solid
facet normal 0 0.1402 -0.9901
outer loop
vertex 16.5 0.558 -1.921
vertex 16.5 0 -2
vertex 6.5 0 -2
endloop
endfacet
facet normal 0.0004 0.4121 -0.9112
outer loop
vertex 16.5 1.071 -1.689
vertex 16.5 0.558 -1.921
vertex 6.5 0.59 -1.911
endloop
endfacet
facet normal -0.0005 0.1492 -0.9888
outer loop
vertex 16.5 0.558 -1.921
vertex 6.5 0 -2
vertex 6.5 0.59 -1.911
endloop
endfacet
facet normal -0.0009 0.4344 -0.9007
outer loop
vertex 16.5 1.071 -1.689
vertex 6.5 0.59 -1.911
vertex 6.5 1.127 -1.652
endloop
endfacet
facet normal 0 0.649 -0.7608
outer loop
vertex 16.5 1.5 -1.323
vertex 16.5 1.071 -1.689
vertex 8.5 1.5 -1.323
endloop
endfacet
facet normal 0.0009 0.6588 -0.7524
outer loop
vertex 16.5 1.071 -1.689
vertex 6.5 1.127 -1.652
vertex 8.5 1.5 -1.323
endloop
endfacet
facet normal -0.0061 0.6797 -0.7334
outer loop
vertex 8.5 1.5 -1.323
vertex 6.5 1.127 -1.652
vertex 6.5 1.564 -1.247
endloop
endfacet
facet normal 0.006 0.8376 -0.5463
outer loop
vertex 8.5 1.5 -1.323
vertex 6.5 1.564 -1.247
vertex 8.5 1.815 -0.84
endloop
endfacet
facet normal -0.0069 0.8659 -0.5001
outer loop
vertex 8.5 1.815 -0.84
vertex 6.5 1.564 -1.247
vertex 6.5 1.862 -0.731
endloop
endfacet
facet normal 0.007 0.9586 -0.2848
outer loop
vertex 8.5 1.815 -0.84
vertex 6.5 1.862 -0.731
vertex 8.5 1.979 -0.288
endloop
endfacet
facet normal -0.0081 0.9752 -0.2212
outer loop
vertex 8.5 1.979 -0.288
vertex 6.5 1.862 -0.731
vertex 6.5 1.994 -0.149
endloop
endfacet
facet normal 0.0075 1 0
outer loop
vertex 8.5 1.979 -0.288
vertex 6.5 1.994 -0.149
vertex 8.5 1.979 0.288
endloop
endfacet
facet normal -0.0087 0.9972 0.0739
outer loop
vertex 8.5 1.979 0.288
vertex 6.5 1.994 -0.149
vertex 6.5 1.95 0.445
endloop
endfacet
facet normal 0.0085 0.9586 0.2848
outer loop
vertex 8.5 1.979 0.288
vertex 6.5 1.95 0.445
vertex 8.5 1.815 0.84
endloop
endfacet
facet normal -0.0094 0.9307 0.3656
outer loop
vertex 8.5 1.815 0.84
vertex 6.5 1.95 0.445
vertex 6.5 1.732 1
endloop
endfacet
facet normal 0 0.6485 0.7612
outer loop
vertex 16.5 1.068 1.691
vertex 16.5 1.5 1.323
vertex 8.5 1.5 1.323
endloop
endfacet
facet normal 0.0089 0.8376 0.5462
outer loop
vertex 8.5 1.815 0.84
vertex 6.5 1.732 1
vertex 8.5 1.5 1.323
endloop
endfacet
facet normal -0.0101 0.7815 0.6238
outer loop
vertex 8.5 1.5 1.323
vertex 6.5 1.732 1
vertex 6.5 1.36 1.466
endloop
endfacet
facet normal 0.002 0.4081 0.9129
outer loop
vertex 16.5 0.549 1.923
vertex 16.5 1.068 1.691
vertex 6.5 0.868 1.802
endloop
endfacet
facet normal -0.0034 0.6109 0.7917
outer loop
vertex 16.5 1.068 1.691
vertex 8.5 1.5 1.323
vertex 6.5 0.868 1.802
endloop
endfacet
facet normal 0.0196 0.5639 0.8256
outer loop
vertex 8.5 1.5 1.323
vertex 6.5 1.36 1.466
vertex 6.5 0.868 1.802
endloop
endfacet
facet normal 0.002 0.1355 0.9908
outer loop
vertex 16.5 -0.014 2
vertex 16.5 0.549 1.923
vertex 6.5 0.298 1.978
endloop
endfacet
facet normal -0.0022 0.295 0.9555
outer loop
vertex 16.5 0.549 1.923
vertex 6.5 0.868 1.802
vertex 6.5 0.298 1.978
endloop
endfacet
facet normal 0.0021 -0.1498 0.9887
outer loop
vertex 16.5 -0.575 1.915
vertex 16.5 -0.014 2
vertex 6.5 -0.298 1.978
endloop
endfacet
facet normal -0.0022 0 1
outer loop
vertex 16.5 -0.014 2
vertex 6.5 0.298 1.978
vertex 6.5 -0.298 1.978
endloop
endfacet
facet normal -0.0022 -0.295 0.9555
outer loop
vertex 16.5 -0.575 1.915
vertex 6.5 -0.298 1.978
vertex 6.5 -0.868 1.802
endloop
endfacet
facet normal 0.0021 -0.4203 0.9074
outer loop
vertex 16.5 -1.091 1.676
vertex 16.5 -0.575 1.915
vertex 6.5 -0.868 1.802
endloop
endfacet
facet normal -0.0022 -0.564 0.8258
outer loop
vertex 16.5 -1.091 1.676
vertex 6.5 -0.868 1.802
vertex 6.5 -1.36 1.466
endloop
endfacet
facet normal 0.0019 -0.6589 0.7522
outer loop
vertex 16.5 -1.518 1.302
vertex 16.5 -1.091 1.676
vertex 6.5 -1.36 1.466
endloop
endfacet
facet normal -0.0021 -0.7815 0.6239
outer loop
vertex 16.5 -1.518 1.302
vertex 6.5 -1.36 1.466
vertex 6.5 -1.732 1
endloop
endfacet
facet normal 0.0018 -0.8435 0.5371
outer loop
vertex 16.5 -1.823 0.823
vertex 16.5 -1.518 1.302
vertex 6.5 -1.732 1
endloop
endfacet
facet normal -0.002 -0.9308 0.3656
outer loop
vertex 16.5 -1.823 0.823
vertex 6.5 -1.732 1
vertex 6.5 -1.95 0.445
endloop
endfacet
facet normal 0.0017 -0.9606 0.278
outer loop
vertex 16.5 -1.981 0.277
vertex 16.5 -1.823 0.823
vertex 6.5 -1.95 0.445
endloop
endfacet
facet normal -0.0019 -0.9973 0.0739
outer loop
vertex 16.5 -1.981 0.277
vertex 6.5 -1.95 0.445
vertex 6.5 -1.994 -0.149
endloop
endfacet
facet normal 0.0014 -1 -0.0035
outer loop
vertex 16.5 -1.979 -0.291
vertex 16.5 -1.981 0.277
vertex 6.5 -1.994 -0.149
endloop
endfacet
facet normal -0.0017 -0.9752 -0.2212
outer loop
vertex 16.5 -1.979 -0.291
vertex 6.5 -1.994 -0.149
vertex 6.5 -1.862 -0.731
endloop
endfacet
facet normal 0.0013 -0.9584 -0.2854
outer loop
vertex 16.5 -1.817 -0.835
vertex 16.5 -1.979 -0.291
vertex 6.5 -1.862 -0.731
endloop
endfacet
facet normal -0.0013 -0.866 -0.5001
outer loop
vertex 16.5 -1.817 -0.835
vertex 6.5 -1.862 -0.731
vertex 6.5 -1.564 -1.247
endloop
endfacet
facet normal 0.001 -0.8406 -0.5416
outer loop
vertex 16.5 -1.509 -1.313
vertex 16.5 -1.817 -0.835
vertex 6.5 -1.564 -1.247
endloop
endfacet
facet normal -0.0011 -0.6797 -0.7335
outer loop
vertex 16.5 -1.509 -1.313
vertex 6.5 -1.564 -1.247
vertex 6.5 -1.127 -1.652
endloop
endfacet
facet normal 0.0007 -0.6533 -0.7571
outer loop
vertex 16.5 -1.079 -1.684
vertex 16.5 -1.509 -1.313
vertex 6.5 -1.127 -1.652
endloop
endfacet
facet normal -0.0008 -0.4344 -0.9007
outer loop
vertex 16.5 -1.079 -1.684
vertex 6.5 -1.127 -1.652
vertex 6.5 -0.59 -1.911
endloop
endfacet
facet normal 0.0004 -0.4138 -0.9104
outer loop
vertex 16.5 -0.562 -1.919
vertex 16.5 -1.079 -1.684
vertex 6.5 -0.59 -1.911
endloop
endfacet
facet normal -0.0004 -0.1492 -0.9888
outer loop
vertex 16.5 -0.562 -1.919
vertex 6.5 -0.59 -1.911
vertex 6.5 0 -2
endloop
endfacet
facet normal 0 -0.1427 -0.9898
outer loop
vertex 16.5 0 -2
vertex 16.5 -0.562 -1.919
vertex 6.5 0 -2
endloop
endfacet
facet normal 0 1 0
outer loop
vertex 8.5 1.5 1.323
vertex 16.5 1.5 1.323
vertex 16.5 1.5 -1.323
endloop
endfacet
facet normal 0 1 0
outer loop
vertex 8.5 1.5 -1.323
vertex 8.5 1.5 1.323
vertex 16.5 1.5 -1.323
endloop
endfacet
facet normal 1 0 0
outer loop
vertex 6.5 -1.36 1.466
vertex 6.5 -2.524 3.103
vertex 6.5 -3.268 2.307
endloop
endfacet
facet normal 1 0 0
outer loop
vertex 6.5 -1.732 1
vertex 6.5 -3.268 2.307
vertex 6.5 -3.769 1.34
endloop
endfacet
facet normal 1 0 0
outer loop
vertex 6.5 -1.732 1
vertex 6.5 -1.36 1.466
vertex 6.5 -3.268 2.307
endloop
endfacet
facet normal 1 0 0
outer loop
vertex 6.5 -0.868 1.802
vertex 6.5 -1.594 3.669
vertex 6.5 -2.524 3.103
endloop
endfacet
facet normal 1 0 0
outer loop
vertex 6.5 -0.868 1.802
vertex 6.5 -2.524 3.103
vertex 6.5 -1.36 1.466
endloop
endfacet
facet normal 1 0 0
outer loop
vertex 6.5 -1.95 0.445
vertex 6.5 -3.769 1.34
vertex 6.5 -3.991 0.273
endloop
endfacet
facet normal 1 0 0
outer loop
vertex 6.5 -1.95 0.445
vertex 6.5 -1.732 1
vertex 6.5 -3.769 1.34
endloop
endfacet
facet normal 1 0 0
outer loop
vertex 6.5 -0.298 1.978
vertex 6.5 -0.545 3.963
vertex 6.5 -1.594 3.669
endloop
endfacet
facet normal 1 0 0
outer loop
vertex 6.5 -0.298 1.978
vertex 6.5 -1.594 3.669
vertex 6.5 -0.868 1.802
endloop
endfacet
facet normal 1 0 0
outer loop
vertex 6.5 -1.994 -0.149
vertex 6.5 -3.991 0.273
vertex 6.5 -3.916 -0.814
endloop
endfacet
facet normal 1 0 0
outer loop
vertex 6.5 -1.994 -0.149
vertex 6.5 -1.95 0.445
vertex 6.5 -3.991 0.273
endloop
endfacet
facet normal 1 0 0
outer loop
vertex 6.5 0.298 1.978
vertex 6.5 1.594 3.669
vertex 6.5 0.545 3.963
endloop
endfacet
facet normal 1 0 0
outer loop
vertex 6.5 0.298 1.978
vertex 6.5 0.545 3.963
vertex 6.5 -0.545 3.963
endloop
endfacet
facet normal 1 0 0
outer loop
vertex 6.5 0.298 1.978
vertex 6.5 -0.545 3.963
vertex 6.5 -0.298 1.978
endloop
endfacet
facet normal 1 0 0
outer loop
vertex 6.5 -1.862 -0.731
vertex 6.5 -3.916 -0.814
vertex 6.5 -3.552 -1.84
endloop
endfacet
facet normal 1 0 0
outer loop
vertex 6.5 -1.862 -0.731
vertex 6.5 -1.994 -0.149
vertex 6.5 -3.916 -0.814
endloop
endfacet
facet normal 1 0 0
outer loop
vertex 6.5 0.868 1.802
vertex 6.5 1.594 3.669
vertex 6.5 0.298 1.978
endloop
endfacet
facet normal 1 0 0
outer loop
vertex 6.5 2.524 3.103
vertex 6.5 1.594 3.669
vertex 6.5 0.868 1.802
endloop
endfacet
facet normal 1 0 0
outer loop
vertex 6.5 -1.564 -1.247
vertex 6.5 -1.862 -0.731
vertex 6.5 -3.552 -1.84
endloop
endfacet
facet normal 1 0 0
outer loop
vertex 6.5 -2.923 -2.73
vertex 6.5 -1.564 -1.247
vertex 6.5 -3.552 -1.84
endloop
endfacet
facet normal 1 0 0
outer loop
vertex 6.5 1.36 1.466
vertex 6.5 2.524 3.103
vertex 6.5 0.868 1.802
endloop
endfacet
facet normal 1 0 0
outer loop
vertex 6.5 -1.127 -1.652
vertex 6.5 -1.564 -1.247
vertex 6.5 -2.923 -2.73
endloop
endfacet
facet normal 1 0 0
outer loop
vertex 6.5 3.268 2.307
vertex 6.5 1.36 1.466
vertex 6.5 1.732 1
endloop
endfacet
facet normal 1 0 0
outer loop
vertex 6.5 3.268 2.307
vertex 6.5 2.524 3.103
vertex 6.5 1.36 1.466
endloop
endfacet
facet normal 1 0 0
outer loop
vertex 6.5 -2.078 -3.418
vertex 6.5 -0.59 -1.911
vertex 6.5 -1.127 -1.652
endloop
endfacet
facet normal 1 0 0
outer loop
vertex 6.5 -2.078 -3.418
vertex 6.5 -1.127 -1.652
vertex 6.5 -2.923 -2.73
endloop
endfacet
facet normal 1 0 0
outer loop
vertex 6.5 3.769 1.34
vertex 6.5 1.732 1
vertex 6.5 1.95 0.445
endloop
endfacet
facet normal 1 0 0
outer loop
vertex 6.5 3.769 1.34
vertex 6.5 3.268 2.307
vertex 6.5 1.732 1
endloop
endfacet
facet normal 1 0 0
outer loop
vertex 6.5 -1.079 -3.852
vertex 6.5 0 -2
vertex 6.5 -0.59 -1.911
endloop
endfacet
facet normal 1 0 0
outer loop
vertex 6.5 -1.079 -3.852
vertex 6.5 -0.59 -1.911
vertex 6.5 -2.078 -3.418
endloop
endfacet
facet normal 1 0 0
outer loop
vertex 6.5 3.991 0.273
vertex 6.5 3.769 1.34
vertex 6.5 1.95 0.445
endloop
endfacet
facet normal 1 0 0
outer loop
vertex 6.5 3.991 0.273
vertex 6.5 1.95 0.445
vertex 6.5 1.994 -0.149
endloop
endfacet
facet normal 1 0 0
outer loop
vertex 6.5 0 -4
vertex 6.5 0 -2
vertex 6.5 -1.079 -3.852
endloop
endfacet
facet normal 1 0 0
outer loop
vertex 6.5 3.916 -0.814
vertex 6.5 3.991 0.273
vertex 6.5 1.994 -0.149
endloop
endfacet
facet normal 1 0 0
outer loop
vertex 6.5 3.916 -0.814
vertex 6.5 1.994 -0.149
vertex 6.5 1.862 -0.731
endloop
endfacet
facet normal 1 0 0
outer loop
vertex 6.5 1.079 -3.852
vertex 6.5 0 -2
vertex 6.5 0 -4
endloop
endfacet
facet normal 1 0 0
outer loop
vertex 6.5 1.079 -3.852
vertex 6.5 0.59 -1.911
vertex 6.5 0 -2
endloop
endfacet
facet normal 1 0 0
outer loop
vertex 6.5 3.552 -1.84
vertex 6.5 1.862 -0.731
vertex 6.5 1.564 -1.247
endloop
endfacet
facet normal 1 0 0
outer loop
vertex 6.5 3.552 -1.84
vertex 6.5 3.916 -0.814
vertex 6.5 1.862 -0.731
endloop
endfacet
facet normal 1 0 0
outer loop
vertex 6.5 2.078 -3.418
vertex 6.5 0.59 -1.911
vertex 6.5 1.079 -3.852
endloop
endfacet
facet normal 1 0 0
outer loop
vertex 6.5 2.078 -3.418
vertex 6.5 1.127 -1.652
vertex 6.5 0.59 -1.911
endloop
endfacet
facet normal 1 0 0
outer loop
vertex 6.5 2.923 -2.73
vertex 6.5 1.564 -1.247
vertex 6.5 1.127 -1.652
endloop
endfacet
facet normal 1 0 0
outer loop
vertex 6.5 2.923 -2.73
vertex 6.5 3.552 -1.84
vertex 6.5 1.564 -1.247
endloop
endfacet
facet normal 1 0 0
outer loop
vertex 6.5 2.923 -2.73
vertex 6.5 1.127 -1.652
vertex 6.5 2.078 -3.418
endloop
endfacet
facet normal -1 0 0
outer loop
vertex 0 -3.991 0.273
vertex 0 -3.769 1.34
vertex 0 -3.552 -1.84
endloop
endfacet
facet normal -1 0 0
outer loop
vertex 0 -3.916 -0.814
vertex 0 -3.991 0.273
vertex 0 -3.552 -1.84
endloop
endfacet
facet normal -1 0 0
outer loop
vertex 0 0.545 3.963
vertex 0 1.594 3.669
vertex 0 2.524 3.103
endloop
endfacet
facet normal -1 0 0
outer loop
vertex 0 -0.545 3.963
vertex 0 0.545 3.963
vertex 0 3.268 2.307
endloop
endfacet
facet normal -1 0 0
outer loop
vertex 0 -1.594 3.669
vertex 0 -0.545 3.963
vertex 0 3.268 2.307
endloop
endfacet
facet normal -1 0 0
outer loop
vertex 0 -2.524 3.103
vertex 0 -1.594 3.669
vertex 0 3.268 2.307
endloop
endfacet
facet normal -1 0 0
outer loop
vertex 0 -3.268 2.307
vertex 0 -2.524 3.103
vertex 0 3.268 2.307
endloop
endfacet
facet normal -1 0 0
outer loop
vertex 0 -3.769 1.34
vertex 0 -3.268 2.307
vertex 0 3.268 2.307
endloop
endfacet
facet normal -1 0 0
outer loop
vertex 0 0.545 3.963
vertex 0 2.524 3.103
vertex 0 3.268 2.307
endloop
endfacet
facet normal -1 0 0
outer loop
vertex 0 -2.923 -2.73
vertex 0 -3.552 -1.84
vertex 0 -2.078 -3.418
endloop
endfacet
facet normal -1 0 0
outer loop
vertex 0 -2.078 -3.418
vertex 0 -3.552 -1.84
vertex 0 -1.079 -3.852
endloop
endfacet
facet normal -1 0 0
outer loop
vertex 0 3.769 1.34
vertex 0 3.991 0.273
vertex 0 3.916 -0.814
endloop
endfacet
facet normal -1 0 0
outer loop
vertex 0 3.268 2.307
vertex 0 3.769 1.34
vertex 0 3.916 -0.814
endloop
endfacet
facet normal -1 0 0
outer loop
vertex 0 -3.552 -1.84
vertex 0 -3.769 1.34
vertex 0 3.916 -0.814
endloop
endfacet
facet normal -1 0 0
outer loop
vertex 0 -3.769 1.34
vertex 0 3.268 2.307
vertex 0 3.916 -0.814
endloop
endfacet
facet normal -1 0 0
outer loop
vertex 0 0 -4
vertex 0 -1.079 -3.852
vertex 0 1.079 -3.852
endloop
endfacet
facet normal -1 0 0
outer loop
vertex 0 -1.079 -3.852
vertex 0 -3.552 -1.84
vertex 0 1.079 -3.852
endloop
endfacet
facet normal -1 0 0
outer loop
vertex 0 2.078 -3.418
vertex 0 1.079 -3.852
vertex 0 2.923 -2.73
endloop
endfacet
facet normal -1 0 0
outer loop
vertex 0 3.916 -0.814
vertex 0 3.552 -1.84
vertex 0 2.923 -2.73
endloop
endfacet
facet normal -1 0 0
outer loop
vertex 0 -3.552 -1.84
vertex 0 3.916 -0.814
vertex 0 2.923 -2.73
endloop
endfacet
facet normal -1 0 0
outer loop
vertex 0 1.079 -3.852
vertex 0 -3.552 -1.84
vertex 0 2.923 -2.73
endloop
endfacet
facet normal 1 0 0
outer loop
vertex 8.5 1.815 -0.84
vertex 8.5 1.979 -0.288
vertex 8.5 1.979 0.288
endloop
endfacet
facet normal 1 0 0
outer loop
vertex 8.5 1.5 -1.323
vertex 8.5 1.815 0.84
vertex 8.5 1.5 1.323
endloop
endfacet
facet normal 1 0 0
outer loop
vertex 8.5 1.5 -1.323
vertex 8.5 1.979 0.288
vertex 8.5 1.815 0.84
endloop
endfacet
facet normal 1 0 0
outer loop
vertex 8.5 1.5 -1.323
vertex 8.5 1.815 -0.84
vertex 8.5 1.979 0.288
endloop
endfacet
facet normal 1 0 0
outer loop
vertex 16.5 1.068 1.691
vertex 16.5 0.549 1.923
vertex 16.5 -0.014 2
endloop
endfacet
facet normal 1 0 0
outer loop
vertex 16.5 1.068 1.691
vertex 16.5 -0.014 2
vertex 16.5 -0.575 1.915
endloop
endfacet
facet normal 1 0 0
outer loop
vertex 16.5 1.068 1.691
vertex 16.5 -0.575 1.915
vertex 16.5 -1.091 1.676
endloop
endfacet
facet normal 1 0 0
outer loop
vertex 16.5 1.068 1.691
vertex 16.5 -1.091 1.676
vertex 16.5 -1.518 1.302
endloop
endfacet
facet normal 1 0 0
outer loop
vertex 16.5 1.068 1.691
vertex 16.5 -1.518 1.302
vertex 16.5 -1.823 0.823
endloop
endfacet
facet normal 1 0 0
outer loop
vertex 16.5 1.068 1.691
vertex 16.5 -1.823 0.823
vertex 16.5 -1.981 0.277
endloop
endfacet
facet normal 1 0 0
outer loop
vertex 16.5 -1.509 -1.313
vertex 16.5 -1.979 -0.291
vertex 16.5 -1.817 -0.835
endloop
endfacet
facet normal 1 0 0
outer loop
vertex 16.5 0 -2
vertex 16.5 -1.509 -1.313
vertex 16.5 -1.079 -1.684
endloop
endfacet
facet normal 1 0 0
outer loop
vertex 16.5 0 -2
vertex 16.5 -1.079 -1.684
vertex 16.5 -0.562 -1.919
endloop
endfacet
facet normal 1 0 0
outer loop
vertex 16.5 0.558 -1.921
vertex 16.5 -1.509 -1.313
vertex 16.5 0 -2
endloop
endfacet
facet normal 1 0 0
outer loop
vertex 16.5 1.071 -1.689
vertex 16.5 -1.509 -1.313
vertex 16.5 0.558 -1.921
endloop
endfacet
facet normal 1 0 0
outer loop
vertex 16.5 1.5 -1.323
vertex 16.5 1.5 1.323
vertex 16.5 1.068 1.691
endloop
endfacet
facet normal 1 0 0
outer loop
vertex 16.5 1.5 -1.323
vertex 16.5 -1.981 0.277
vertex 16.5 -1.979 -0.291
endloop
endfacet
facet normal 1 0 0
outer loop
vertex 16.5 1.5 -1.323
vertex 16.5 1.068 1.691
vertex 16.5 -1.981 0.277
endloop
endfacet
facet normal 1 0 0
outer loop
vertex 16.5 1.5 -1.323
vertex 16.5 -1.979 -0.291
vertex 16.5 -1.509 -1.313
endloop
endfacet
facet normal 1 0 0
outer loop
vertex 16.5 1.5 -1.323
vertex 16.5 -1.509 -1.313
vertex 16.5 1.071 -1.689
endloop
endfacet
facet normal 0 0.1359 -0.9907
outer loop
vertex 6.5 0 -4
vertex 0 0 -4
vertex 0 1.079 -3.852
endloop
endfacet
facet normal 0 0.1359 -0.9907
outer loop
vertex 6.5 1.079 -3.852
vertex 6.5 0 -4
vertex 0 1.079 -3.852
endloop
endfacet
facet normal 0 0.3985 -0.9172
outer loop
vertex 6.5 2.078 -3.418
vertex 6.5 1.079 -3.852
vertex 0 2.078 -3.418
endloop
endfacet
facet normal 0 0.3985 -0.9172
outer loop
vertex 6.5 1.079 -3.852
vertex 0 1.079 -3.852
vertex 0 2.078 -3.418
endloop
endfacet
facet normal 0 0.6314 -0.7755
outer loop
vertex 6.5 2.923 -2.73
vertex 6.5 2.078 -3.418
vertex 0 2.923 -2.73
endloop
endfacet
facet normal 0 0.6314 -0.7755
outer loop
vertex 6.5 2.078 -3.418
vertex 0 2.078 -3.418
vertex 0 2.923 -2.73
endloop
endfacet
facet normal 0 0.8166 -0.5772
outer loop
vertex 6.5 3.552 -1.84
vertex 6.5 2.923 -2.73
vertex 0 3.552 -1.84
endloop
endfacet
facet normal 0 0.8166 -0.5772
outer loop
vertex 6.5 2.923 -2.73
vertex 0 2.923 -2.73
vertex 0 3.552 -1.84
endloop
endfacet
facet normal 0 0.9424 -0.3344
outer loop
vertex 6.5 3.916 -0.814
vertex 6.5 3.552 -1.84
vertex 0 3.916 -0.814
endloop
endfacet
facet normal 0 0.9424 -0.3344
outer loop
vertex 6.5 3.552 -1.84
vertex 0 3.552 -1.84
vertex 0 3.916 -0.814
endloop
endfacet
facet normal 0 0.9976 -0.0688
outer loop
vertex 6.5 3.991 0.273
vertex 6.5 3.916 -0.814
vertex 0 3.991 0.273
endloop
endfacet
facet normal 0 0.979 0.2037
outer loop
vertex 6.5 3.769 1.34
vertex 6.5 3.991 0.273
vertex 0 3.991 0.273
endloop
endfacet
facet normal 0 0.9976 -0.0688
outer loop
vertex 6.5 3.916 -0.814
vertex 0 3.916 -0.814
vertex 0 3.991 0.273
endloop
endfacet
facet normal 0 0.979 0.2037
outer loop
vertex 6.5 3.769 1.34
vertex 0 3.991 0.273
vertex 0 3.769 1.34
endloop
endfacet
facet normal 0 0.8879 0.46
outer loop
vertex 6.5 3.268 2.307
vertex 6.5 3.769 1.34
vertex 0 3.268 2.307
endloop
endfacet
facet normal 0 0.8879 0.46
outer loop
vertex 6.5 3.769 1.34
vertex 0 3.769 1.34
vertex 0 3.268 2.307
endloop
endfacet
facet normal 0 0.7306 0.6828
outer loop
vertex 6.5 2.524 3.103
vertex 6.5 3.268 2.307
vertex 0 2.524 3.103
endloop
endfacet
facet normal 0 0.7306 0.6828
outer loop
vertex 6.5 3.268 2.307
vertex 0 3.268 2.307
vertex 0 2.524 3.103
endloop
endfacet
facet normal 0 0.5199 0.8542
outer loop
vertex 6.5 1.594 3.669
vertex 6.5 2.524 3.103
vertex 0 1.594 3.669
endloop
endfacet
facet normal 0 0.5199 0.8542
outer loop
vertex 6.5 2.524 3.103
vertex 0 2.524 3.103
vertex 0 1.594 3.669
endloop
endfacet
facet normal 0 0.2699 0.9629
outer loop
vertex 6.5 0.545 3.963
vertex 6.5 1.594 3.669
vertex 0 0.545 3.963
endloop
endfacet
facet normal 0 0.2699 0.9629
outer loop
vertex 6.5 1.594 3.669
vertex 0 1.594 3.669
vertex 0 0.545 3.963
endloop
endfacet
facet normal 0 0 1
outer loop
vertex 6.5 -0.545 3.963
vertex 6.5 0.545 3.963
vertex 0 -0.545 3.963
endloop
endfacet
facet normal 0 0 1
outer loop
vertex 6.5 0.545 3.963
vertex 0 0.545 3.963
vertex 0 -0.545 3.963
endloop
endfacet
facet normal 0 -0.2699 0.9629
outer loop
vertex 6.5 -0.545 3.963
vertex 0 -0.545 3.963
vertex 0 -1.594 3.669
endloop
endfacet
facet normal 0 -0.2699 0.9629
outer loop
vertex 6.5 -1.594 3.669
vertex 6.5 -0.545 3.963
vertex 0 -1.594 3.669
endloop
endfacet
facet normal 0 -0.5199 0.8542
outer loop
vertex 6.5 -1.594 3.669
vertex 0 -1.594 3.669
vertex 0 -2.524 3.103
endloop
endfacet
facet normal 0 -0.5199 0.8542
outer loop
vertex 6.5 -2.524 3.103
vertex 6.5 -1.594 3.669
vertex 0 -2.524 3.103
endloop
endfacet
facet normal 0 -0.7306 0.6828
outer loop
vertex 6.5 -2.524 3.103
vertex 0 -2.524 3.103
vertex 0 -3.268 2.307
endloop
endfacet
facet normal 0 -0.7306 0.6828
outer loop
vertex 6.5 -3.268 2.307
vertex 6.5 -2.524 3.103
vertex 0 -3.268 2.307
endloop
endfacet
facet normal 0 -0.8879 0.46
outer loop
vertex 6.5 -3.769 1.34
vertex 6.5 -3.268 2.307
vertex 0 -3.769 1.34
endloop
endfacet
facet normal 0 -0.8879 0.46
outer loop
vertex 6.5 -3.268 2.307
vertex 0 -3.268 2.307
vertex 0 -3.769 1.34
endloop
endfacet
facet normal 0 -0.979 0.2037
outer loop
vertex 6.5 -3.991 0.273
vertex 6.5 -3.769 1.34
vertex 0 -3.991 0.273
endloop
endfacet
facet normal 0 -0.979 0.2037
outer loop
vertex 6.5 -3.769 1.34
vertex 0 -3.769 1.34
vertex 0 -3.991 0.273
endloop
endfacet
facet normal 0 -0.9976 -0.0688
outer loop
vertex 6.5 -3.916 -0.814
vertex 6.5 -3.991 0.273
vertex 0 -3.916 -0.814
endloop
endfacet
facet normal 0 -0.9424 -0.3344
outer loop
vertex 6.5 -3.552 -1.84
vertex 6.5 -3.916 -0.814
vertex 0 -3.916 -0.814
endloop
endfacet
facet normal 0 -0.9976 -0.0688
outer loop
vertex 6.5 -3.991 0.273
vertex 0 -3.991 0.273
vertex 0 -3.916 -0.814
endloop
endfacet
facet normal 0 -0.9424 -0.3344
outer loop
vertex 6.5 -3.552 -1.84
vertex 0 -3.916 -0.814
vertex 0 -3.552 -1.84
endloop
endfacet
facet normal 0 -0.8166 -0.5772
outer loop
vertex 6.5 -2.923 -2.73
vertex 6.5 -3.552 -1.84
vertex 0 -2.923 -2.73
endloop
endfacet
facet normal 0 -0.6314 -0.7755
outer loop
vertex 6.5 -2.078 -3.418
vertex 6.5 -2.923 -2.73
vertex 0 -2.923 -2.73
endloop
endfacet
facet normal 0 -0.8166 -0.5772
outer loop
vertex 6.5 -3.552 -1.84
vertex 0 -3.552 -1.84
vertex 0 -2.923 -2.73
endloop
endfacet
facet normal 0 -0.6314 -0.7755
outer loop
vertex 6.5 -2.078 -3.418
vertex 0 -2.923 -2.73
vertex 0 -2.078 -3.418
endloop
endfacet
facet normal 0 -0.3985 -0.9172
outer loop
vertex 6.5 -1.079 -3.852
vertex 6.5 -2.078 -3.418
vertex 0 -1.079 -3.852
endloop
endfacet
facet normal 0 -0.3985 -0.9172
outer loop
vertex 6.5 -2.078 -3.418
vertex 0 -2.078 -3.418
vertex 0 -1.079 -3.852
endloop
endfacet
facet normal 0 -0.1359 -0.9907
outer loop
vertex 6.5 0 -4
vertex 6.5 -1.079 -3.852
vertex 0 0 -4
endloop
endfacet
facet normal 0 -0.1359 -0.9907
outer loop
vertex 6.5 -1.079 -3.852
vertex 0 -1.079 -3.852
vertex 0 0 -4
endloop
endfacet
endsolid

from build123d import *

# Parameters (mm, degrees)
ESQUISSE1_R             = 4
BOSS_EXTRU_1_DEPTH      = 6.5
ESQUISSE2_R             = 2
BOSS_EXTRU_2_DEPTH      = 10
ESQUISSE3_W             = 4
ESQUISSE3_H             = 0.5
ENL_V_MAT_EXTRU_1_DEPTH = 8


with BuildPart() as part:
    # Esquisse1 → Boss.-Extru.1 (new body)
    with BuildSketch(Plane(origin=(0, 0, 0), x_dir=(0, 0, -1), z_dir=(1, 0, 0))):
        Circle(ESQUISSE1_R)
    extrude(amount=BOSS_EXTRU_1_DEPTH)

    # Esquisse2 → Boss.-Extru.2 (add)
    with BuildSketch(Plane(origin=(6.5, 0, 0), x_dir=(0, 0, -1), z_dir=(1, 0, 0))):
        Circle(ESQUISSE2_R)
    extrude(amount=BOSS_EXTRU_2_DEPTH)

    # Esquisse3 → Enlèv. mat.-Extru.1 (cut)
    with BuildSketch(Plane(origin=(16.5, 0, 0), x_dir=(0, 0, -1), z_dir=(1, 0, 0))):
        with Locations((0, 1.75)):
            Rectangle(ESQUISSE3_W, ESQUISSE3_H)
    extrude(amount=-ENL_V_MAT_EXTRU_1_DEPTH, mode=Mode.SUBTRACT)


solid = part.part
